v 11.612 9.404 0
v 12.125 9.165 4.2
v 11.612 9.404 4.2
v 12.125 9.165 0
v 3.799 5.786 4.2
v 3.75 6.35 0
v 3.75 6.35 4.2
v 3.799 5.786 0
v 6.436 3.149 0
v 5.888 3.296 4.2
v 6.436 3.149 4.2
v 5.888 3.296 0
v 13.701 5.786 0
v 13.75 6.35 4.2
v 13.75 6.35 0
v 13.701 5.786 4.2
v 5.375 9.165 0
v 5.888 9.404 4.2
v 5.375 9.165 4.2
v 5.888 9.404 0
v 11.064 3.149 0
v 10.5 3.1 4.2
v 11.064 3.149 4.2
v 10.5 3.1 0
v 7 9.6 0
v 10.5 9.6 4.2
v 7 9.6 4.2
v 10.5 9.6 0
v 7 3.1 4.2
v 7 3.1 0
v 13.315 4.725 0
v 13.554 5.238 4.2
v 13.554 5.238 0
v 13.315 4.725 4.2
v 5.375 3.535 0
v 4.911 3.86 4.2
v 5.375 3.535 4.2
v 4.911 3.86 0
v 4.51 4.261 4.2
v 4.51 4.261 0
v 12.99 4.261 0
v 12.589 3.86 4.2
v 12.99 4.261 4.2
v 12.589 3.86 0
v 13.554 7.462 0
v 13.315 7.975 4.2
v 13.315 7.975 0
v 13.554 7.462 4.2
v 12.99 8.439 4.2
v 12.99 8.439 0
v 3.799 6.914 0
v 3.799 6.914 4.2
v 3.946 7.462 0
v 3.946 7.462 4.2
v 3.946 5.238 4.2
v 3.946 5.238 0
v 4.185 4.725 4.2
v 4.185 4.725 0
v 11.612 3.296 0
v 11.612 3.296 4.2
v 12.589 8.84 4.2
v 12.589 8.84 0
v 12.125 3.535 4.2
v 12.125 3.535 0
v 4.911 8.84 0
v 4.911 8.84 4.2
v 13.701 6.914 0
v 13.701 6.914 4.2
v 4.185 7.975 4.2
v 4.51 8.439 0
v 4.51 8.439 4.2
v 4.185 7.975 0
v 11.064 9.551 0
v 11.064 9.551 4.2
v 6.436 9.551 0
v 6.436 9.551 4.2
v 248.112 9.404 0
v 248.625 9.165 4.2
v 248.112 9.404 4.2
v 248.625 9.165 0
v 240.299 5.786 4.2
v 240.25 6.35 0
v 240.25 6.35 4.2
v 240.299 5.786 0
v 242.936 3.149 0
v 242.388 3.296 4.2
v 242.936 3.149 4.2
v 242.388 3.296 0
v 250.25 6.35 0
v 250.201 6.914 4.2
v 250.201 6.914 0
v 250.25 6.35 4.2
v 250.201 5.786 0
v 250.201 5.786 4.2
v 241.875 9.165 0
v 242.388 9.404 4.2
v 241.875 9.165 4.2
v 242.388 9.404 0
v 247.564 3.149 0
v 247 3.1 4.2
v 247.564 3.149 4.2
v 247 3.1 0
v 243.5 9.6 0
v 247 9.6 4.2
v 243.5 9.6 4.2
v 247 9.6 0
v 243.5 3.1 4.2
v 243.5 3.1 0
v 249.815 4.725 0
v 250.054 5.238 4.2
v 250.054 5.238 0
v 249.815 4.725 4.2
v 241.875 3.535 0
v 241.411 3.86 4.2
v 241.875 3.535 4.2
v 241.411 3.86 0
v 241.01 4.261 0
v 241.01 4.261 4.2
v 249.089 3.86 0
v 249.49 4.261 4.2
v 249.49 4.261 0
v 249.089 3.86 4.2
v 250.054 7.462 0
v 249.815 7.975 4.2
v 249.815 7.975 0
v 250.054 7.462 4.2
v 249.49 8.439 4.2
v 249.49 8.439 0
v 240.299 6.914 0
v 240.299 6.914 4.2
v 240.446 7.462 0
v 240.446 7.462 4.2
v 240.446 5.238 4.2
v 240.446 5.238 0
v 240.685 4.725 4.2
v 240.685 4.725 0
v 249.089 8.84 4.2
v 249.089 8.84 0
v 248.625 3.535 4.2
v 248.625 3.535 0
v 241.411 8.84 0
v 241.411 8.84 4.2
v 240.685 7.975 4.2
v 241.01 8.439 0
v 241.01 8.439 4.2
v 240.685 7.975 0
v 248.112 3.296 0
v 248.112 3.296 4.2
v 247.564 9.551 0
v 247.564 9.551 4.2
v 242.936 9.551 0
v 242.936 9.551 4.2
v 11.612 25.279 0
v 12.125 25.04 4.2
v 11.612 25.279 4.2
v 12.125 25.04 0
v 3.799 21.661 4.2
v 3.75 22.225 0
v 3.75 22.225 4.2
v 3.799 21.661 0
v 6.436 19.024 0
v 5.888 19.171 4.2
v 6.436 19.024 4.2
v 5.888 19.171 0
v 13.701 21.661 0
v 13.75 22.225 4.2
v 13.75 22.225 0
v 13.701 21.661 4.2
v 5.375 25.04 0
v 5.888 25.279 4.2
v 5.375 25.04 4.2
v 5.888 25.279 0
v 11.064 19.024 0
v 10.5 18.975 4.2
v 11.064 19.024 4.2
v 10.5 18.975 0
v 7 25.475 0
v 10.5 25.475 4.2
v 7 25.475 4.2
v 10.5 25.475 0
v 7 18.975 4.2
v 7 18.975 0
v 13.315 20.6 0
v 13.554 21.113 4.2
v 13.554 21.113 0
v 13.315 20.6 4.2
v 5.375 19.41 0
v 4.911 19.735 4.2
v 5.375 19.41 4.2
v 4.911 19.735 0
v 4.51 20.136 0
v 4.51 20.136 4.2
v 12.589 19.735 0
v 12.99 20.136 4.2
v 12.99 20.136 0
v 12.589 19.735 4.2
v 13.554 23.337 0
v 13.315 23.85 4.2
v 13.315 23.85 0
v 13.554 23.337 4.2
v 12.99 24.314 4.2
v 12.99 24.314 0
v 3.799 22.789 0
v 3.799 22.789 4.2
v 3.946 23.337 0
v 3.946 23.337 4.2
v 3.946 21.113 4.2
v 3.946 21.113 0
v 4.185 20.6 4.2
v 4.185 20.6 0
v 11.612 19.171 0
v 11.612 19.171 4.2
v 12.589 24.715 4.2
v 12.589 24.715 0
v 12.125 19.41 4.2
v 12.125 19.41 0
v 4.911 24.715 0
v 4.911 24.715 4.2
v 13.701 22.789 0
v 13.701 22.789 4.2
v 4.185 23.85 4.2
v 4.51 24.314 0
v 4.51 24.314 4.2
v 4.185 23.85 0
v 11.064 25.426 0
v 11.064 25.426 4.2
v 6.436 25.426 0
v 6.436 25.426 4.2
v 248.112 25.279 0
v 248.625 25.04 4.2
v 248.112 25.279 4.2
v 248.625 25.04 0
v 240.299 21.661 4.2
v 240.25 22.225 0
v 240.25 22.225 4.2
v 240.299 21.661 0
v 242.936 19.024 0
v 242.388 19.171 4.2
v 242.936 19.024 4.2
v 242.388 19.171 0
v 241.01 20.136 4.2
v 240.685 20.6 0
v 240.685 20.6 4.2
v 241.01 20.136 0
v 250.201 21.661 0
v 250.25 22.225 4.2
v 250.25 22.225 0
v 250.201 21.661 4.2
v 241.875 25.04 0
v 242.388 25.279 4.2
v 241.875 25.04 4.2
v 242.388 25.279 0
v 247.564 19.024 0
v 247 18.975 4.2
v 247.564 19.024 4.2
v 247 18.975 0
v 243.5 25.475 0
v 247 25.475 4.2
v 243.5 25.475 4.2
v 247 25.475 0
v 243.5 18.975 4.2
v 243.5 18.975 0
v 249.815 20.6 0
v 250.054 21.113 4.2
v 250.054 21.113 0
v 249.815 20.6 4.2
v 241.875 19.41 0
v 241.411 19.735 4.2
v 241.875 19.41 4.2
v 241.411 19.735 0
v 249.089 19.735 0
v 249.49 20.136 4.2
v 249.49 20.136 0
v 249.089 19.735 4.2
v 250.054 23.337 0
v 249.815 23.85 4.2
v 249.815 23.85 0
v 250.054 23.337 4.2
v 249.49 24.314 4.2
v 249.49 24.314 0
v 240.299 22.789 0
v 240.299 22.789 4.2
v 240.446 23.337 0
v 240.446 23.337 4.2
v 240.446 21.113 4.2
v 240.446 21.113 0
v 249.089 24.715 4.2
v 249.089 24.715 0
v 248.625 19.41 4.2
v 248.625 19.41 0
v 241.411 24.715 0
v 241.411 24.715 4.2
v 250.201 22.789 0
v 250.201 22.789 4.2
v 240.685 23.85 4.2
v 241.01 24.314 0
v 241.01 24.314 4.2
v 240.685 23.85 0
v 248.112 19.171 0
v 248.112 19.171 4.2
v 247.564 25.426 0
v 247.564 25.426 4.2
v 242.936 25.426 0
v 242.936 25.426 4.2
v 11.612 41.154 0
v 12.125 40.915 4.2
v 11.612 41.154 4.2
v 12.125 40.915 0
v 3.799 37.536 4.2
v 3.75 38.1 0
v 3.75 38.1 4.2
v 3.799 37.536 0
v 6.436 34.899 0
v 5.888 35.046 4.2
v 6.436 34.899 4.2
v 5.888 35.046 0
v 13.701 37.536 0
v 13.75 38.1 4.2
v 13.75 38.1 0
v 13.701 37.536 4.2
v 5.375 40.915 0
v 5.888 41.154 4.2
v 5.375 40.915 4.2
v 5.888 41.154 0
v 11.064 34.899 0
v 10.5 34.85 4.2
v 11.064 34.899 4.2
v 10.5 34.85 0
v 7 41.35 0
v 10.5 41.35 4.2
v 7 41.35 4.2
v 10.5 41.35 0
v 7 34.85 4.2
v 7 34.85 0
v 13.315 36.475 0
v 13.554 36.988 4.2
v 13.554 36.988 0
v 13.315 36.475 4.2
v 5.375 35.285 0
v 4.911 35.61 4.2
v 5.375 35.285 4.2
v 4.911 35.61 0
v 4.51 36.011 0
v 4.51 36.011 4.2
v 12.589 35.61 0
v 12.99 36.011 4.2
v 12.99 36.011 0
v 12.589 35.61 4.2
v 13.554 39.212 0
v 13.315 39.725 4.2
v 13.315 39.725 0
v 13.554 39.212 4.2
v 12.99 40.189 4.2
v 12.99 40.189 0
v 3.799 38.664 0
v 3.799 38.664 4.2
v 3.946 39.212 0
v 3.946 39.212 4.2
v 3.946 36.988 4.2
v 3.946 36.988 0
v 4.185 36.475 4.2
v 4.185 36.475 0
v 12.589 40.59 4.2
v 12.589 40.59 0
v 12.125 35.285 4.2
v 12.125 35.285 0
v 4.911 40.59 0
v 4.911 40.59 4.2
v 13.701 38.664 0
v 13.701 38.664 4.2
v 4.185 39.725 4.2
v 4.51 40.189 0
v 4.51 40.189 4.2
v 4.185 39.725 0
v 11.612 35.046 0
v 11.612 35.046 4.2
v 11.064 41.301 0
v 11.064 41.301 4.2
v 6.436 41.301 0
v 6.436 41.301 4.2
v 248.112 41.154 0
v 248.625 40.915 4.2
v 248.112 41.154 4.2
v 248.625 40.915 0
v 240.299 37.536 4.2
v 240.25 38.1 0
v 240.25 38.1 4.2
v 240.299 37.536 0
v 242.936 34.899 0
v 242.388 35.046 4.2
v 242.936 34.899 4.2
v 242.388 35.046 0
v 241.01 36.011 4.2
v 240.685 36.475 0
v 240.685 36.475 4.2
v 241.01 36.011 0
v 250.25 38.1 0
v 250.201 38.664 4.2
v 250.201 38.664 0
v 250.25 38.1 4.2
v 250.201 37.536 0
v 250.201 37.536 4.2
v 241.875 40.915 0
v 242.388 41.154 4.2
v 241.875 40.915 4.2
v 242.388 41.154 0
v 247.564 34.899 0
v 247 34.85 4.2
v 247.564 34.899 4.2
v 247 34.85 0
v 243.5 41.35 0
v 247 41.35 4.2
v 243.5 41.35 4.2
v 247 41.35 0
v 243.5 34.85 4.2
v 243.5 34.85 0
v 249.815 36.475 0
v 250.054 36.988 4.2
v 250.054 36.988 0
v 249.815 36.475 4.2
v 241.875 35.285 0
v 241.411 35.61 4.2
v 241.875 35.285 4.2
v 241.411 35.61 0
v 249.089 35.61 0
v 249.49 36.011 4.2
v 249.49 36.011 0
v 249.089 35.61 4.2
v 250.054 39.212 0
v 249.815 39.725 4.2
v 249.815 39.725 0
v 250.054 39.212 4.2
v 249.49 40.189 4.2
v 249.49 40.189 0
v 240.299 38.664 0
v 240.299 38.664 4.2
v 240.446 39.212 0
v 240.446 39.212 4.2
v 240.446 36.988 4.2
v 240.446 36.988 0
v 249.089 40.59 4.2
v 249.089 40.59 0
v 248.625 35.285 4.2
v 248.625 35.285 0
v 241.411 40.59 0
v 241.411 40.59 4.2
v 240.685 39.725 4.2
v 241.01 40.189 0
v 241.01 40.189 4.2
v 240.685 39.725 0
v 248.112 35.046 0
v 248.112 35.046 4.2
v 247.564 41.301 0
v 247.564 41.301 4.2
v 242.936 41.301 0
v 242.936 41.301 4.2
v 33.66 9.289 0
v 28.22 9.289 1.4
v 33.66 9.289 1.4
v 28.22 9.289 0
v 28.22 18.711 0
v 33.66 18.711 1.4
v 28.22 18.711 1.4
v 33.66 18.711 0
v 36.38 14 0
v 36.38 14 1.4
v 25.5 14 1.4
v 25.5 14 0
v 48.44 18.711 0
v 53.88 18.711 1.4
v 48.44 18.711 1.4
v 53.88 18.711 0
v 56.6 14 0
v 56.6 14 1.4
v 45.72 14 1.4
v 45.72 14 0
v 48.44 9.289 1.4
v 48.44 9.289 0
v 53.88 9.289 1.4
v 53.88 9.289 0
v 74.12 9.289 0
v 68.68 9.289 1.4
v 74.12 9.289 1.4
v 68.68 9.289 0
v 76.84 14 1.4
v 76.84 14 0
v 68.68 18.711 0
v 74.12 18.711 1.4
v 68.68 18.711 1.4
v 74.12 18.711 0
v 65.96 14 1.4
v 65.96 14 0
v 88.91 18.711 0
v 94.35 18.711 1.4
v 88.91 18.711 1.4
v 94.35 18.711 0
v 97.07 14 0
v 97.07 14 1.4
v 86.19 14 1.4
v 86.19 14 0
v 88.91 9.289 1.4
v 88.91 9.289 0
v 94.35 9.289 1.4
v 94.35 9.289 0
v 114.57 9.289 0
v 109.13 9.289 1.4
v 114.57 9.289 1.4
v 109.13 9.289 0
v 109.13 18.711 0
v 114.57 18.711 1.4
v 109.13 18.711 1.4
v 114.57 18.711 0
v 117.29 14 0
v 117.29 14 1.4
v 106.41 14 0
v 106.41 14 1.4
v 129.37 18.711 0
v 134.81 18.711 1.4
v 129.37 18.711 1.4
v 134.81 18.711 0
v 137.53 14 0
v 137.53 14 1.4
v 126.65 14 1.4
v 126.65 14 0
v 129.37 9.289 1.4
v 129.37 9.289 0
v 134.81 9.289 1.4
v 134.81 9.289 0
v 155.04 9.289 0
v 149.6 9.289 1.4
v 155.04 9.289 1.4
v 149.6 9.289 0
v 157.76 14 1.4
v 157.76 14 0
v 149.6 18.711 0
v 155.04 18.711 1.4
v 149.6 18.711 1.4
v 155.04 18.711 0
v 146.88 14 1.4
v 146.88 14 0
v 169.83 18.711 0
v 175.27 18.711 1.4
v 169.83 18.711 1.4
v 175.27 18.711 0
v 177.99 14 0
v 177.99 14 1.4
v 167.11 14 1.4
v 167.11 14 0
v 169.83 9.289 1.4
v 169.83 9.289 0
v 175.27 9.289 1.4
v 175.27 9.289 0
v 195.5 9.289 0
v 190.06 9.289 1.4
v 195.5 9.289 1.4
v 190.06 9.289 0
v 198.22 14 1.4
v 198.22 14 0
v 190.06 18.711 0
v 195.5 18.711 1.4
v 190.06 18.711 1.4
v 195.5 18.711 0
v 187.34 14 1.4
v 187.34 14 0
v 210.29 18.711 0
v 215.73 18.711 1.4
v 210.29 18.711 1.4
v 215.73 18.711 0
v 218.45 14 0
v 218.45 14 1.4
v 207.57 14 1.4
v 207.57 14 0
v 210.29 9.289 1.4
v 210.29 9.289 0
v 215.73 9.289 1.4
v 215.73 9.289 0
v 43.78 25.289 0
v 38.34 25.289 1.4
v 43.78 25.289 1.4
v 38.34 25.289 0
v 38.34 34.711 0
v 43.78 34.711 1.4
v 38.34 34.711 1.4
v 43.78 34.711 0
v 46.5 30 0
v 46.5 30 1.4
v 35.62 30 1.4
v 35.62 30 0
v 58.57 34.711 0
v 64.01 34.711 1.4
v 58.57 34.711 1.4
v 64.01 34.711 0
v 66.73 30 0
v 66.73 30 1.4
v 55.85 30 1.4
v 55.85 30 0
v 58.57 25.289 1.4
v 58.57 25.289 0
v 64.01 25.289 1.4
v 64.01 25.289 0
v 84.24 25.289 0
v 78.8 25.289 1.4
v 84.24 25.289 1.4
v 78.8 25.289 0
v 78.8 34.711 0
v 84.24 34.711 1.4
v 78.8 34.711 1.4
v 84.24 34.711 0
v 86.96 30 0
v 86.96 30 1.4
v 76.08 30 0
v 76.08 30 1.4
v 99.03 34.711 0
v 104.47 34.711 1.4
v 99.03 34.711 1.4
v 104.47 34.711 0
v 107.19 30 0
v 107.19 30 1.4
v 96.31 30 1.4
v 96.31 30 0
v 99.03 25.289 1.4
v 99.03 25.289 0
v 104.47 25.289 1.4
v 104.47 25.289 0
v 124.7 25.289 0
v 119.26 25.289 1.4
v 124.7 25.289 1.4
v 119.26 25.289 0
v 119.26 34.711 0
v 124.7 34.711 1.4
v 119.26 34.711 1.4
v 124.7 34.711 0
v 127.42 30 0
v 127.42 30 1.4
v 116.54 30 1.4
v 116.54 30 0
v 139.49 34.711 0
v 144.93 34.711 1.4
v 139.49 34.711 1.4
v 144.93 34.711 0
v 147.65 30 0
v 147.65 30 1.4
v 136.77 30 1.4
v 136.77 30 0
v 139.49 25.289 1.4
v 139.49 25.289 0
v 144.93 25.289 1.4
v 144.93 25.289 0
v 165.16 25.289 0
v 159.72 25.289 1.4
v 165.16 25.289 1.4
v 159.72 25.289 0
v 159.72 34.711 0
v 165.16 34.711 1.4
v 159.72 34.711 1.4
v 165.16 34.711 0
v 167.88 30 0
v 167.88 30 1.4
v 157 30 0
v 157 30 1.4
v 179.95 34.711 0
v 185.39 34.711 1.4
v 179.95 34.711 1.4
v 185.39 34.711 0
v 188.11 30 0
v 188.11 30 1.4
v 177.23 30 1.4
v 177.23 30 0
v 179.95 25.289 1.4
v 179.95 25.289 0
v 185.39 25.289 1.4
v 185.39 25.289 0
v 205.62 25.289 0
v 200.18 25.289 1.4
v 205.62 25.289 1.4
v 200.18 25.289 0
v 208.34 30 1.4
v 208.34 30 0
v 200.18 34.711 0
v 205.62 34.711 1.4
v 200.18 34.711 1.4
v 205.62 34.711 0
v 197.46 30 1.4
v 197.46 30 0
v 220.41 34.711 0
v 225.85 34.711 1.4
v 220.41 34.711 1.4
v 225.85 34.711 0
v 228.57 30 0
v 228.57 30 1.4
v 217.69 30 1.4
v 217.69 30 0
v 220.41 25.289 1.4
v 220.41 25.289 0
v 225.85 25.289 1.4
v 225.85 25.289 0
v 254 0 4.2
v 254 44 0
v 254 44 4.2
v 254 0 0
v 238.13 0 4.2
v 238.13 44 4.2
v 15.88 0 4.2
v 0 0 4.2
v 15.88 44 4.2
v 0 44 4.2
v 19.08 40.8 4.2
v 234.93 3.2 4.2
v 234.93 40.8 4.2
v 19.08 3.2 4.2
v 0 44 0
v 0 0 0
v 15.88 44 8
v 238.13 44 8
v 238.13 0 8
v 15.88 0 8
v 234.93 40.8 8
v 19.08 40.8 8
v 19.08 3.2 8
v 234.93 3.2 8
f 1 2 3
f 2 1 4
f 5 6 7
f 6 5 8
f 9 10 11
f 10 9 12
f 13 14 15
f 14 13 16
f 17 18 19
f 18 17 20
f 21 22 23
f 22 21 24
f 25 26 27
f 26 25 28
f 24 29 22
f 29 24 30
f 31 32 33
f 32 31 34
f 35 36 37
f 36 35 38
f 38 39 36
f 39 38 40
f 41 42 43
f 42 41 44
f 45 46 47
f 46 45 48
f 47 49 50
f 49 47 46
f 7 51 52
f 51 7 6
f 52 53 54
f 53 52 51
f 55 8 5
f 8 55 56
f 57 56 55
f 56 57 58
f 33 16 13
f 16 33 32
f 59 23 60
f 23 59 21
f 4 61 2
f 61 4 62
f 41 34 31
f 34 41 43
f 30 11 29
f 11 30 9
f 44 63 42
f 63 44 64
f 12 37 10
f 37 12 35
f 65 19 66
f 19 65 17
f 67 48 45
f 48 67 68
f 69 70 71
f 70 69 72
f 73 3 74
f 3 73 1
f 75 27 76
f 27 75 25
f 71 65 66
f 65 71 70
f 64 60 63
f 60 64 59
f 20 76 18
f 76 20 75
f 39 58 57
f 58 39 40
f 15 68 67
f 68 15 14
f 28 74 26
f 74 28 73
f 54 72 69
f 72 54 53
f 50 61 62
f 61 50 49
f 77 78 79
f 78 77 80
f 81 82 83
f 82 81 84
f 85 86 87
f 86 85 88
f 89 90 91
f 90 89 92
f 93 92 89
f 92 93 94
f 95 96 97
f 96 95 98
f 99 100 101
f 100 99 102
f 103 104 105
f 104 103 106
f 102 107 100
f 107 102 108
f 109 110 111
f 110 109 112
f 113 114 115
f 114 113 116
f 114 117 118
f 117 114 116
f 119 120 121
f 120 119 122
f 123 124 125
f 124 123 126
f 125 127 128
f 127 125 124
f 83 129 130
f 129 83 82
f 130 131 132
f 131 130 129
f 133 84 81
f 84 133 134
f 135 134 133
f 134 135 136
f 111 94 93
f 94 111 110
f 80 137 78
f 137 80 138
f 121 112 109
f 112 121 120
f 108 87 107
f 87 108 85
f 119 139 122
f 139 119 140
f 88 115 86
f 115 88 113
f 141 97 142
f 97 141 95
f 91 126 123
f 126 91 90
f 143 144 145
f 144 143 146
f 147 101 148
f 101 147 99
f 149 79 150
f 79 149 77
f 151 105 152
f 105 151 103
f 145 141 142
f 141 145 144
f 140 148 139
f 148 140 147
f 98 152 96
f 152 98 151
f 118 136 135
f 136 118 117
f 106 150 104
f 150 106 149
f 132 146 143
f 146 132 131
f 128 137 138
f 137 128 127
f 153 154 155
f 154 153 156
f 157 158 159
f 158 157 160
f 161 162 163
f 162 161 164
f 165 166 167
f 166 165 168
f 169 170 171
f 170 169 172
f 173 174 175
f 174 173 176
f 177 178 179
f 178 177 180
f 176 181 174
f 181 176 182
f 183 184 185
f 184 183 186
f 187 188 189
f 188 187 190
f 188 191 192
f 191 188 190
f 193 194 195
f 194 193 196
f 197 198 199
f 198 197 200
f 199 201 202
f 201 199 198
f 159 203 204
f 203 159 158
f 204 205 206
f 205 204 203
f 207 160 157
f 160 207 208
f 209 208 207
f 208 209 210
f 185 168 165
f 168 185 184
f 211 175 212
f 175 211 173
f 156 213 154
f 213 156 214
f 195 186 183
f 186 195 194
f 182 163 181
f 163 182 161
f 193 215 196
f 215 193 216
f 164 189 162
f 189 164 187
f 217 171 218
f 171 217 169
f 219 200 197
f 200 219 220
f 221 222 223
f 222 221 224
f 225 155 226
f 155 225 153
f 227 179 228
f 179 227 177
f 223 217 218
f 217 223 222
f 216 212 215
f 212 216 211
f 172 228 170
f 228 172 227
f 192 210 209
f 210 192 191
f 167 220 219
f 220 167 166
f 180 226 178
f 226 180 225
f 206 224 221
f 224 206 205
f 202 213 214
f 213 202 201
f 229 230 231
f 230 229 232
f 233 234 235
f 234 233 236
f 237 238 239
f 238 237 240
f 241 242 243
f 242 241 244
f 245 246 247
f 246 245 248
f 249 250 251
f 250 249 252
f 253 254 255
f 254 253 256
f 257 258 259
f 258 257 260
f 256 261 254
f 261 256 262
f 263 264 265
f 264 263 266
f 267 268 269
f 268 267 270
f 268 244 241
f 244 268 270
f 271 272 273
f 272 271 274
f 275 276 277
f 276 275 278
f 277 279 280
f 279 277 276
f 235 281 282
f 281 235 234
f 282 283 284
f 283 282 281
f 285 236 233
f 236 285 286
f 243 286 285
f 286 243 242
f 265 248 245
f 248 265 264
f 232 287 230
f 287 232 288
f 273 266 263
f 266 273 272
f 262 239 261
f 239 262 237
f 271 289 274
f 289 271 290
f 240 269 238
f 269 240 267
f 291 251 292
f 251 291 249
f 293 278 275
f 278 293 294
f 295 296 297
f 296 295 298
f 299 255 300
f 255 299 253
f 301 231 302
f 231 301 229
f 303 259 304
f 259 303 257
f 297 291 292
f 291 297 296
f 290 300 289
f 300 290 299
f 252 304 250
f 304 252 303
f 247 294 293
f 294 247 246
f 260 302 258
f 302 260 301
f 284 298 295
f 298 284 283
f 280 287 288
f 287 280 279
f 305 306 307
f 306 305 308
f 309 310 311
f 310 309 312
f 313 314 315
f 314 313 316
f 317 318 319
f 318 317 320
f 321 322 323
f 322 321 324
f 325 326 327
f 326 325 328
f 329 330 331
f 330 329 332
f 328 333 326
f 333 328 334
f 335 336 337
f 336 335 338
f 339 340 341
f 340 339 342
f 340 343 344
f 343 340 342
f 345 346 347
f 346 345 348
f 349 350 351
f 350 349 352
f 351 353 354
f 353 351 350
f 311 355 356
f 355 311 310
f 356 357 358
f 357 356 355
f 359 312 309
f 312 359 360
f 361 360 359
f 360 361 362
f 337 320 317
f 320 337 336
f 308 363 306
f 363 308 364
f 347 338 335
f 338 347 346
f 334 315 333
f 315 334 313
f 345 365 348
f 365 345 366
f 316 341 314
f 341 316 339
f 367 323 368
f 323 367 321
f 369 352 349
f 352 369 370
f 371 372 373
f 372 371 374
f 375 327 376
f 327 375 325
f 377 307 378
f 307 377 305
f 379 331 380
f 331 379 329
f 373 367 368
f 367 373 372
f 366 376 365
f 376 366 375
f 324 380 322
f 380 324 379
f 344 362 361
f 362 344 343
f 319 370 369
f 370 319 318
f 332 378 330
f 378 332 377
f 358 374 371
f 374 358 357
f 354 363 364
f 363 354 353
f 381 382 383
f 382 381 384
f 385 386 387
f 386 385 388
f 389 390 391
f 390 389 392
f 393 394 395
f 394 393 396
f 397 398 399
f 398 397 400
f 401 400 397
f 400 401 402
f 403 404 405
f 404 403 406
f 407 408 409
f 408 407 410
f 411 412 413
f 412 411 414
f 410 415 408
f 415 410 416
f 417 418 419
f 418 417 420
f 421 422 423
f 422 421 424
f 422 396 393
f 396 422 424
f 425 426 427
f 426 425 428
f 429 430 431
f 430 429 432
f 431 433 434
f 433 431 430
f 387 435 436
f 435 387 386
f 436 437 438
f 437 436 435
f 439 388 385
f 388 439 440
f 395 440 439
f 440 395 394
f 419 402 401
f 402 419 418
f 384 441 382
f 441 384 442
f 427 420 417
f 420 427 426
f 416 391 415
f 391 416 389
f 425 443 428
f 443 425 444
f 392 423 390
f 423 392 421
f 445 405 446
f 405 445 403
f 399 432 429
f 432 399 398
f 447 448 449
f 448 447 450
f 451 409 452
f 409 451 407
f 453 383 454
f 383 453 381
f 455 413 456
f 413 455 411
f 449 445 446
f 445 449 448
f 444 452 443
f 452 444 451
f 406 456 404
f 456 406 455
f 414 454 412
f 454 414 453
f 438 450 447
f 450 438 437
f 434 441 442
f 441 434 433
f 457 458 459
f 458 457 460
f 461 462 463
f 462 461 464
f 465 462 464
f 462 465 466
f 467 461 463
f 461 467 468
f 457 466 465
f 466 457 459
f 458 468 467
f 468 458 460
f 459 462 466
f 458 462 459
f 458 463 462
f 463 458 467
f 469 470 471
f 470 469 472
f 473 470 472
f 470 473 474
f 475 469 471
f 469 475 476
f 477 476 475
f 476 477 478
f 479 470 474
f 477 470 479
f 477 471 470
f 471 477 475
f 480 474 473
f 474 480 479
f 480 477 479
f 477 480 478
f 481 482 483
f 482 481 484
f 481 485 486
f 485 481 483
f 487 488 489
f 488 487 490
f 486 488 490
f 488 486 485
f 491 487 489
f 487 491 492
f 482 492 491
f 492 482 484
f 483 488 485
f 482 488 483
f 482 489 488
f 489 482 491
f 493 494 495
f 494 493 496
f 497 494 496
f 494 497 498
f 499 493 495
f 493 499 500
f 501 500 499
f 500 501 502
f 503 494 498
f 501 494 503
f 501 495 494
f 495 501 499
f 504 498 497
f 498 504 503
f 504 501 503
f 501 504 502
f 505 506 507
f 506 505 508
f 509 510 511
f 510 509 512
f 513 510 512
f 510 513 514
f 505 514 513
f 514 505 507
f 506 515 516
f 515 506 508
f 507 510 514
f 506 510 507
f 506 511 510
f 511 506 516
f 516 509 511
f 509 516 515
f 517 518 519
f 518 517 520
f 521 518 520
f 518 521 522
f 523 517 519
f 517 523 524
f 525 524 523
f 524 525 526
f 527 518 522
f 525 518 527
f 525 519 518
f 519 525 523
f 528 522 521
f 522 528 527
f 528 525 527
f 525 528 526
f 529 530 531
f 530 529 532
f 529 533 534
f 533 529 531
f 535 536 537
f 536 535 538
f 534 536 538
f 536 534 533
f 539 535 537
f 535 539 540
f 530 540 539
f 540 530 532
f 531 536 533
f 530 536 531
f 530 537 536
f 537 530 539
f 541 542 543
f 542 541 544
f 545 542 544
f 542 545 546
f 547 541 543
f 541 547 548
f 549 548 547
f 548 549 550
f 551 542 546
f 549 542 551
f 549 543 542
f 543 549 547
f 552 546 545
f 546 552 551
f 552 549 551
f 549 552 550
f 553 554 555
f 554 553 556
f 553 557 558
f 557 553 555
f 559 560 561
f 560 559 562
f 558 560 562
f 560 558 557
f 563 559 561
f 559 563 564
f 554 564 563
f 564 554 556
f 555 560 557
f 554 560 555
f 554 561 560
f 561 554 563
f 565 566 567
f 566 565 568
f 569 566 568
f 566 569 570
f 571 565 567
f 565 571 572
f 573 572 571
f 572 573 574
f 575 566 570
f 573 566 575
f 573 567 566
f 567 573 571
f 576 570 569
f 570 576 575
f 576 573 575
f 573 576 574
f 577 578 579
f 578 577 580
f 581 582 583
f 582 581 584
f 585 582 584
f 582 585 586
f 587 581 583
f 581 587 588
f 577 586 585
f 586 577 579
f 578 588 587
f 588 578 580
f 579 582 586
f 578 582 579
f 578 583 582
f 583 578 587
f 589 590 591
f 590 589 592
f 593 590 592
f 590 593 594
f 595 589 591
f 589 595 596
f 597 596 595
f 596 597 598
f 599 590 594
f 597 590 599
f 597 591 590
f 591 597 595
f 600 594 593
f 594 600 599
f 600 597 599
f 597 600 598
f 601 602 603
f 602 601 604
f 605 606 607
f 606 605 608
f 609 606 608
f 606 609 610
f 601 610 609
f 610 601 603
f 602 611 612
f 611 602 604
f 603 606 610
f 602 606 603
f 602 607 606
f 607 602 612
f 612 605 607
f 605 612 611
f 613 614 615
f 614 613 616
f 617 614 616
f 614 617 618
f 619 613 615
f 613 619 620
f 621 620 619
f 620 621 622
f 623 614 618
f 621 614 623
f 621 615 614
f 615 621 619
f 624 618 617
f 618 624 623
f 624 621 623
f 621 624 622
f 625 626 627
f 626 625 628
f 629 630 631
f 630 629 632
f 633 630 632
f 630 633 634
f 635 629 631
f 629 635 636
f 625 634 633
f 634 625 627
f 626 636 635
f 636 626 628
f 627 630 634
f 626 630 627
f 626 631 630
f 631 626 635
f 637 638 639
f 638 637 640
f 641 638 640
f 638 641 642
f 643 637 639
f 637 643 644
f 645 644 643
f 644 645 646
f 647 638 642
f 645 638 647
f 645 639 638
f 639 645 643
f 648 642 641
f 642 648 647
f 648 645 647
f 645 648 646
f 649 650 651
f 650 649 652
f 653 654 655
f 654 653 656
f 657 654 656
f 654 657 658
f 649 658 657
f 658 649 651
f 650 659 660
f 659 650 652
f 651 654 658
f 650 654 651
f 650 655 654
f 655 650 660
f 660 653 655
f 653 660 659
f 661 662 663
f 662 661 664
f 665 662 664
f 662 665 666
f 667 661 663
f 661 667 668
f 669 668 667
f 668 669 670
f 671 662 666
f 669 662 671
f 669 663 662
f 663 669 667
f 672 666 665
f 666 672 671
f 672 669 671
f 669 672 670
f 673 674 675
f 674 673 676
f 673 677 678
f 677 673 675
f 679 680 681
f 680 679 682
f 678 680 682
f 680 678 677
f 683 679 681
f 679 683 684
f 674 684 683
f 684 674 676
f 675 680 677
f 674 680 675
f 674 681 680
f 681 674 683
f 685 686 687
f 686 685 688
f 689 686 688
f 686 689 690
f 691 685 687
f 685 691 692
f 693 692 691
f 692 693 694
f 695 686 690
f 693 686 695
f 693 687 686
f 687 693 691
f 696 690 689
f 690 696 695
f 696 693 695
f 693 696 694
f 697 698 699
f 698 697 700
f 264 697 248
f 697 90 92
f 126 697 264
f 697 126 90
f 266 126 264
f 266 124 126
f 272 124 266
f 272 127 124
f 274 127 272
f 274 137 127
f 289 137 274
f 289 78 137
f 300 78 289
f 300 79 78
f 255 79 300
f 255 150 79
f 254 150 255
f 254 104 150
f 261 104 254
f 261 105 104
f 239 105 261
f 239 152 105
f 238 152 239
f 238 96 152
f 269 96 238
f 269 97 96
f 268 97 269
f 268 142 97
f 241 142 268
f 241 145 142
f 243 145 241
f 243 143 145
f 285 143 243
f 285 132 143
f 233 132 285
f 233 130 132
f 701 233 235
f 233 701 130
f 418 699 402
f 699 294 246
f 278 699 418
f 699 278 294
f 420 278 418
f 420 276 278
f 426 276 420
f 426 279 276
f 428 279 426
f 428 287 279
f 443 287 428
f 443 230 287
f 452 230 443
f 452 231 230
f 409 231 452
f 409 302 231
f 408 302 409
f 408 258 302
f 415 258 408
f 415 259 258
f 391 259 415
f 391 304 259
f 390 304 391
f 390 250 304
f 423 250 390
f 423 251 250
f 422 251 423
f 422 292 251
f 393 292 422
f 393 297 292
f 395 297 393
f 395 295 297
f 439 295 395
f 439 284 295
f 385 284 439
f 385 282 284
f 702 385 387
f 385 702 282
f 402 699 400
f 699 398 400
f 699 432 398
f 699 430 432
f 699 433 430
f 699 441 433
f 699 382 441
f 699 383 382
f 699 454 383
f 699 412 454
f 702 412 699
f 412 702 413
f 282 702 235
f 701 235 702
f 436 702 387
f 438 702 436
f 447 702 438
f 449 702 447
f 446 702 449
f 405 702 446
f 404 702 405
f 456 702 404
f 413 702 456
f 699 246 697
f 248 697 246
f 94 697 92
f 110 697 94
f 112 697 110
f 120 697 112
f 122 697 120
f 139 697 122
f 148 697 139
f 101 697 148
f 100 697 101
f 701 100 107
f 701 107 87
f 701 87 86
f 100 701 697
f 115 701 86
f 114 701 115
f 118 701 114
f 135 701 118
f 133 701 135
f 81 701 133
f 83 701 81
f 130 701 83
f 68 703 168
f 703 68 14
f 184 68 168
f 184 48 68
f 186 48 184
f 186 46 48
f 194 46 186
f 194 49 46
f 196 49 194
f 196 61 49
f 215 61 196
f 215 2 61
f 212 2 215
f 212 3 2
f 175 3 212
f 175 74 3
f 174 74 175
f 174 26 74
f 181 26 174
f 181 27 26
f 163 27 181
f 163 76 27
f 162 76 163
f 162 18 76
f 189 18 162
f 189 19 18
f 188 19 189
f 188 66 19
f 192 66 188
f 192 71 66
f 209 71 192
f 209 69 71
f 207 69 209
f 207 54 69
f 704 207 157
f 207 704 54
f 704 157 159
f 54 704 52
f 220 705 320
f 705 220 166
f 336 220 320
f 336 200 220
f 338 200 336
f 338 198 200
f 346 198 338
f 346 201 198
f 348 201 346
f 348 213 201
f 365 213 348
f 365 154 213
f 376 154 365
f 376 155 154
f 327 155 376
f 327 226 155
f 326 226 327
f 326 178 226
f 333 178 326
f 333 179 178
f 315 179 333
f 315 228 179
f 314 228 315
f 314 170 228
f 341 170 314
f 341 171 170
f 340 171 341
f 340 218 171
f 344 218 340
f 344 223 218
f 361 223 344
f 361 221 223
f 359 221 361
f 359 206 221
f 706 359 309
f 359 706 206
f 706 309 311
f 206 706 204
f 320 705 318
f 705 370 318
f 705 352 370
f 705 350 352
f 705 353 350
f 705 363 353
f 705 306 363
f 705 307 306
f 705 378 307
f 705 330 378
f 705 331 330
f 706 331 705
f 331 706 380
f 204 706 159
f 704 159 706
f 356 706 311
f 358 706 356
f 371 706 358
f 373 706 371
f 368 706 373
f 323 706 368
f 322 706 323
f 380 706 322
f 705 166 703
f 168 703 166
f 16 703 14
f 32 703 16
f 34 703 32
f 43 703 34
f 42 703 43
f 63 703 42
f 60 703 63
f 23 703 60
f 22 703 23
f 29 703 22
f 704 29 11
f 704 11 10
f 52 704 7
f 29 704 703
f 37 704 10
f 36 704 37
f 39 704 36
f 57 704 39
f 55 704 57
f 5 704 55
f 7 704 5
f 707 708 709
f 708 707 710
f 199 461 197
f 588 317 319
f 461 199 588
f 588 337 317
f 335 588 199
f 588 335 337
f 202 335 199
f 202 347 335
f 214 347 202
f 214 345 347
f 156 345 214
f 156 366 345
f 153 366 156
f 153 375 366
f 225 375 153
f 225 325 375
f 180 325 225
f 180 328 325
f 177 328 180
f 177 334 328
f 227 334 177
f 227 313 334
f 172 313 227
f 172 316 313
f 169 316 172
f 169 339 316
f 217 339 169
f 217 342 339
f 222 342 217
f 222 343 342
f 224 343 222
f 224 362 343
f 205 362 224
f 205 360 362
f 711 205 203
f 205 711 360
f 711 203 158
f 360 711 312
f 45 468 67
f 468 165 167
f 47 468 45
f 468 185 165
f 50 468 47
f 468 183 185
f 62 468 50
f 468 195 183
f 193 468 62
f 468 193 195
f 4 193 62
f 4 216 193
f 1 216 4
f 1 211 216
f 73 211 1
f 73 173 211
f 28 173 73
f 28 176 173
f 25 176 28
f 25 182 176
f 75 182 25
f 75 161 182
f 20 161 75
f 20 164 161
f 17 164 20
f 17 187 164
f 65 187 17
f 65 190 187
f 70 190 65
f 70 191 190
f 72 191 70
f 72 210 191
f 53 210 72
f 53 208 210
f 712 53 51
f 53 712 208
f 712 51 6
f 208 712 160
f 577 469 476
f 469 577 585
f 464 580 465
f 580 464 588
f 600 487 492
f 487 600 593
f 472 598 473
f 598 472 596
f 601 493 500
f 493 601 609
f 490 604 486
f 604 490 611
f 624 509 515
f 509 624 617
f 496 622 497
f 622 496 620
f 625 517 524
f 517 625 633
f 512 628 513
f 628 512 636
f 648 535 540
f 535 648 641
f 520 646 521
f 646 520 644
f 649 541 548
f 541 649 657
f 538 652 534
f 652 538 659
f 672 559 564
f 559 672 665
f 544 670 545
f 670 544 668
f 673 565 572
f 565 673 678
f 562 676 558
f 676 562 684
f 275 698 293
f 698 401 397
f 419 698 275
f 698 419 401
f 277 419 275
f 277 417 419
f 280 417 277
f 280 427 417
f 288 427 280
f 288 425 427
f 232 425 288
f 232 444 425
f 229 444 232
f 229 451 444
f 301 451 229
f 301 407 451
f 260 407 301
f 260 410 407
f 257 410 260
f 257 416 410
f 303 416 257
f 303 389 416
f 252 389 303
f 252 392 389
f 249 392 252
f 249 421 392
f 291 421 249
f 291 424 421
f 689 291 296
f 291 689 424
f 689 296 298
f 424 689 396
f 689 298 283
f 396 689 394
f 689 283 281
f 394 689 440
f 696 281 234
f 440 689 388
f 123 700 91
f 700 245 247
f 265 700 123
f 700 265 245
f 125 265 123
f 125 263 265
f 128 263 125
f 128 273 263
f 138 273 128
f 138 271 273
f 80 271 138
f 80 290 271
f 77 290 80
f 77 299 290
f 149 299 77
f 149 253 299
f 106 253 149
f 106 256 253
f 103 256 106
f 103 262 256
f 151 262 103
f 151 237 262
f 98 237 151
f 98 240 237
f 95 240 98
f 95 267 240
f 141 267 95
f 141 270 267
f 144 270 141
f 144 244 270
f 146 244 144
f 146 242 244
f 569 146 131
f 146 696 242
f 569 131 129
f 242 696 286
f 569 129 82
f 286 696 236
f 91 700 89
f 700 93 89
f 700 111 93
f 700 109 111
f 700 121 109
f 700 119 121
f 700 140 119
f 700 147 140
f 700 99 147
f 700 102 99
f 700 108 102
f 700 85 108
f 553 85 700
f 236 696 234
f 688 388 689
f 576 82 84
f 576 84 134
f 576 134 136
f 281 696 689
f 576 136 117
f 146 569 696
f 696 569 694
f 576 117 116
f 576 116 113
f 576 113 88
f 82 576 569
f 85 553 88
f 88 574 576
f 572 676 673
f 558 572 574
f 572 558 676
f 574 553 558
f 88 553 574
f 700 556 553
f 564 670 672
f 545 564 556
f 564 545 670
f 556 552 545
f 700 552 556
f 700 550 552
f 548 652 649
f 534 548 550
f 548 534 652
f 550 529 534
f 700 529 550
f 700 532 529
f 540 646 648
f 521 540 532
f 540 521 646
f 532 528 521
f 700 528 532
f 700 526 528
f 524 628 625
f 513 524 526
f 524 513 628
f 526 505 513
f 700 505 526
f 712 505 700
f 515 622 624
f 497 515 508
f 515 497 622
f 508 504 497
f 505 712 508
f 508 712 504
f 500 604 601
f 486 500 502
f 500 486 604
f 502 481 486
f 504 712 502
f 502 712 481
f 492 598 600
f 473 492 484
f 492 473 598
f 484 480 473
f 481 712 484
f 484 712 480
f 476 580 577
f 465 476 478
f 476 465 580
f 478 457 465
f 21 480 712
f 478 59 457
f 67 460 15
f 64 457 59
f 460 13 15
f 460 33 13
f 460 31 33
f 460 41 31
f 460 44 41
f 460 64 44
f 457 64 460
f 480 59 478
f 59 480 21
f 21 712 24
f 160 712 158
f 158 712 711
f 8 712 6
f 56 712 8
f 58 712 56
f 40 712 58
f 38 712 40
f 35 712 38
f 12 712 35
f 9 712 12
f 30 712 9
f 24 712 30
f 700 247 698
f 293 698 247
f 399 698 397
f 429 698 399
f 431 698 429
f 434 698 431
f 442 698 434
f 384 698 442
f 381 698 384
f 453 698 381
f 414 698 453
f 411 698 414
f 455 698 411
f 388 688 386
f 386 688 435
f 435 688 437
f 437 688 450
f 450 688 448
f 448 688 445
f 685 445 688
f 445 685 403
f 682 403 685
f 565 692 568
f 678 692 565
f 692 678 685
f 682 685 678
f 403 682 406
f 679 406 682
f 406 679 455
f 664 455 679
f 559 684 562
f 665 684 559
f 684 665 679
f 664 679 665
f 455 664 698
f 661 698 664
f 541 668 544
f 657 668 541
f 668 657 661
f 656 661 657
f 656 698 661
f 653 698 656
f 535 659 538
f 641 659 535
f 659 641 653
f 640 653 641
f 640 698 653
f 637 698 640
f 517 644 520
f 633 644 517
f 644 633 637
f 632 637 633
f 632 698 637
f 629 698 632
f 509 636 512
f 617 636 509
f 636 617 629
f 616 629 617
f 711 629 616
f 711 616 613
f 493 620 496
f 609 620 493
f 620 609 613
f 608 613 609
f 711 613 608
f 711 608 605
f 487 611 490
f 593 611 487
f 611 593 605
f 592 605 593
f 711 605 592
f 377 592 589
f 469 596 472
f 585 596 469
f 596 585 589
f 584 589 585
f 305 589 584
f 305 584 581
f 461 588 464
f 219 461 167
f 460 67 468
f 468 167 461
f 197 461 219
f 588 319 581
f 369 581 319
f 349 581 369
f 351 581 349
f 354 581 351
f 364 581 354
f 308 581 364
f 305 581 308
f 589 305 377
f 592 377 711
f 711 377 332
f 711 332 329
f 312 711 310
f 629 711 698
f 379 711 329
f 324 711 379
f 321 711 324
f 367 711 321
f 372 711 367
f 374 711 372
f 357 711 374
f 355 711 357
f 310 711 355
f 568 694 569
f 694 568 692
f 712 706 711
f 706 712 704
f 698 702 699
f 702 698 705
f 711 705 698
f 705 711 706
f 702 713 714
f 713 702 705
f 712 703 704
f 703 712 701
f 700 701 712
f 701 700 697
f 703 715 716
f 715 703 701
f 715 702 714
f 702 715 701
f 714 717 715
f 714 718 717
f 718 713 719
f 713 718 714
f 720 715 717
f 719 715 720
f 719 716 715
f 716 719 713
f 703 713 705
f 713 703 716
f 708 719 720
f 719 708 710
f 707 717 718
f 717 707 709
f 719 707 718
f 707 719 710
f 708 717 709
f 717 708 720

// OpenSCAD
// ============================================================================
// RackArchitect MCP — Parametric 3D-Printable Slot Cover Panel (.scad)
// Blueprint: Community 3D-Print 10-Inch 1U Designer Cover Panel (Hexagonal Honeycomb Relief) (3dprint-10inch-cover-panel-hex-1u)
// Standard:  10INCH EIA-310 (254mm Total Width, 1U = 44mm)
// Pattern:   HEX (Closed Front Faceplate — Zero Cable Pass-Through)
// Material:  PETG / PLA
// ============================================================================

/* [EIA-310 Cover Panel Parameters (mm)] */
panel_width_mm = 254;
aperture_width_mm = 222.25;
hole_center_pitch_x_mm = 236.5;
panel_height_mm = 44;
u_count = 1;
faceplate_thickness_mm = 4.2;
stiffener_depth_mm = 8;
stiffener_wall_mm = 3.2;
pattern_groove_depth_mm = 1.4;
$fn = 36;

module oval_mounting_slot(slot_w = 10.0, slot_h = 6.5, thickness = 10.0) {
  hull() {
    translate([-(slot_w - slot_h) / 2, 0, -1]) cylinder(d = slot_h, h = thickness);
    translate([ (slot_w - slot_h) / 2, 0, -1]) cylinder(d = slot_h, h = thickness);
  }
}

module eia310_ear_holes() {
  left_hole_x = (panel_width_mm - hole_center_pitch_x_mm) / 2;
  right_hole_x = panel_width_mm - left_hole_x;
  for (u = [0 : u_count - 1]) {
    base_y = u * 44.45;
    for (offset_y = [6.35, 22.225, 38.10]) {
      if (base_y + offset_y < panel_height_mm - 3.0) {
        translate([left_hole_x, base_y + offset_y, 0]) oval_mounting_slot();
        translate([right_hole_x, base_y + offset_y, 0]) oval_mounting_slot();
      }
    }
  }
}

module front_surface_pattern_grooves() {
  // Blind hexagonal honeycomb relief cells (2x10, closed 2.8mm rear baffle wall)
  translate([30.94, 14, -0.5]) cylinder(d = 10.88, h = pattern_groove_depth_mm + 0.5, $fn = 6);
  translate([51.16, 14, -0.5]) cylinder(d = 10.88, h = pattern_groove_depth_mm + 0.5, $fn = 6);
  translate([71.4, 14, -0.5]) cylinder(d = 10.88, h = pattern_groove_depth_mm + 0.5, $fn = 6);
  translate([91.63, 14, -0.5]) cylinder(d = 10.88, h = pattern_groove_depth_mm + 0.5, $fn = 6);
  translate([111.85, 14, -0.5]) cylinder(d = 10.88, h = pattern_groove_depth_mm + 0.5, $fn = 6);
  translate([132.09, 14, -0.5]) cylinder(d = 10.88, h = pattern_groove_depth_mm + 0.5, $fn = 6);
  translate([152.32, 14, -0.5]) cylinder(d = 10.88, h = pattern_groove_depth_mm + 0.5, $fn = 6);
  translate([172.55, 14, -0.5]) cylinder(d = 10.88, h = pattern_groove_depth_mm + 0.5, $fn = 6);
  translate([192.78, 14, -0.5]) cylinder(d = 10.88, h = pattern_groove_depth_mm + 0.5, $fn = 6);
  translate([213.01, 14, -0.5]) cylinder(d = 10.88, h = pattern_groove_depth_mm + 0.5, $fn = 6);
  translate([41.06, 30, -0.5]) cylinder(d = 10.88, h = pattern_groove_depth_mm + 0.5, $fn = 6);
  translate([61.29, 30, -0.5]) cylinder(d = 10.88, h = pattern_groove_depth_mm + 0.5, $fn = 6);
  translate([81.52, 30, -0.5]) cylinder(d = 10.88, h = pattern_groove_depth_mm + 0.5, $fn = 6);
  translate([101.75, 30, -0.5]) cylinder(d = 10.88, h = pattern_groove_depth_mm + 0.5, $fn = 6);
  translate([121.98, 30, -0.5]) cylinder(d = 10.88, h = pattern_groove_depth_mm + 0.5, $fn = 6);
  translate([142.21, 30, -0.5]) cylinder(d = 10.88, h = pattern_groove_depth_mm + 0.5, $fn = 6);
  translate([162.44, 30, -0.5]) cylinder(d = 10.88, h = pattern_groove_depth_mm + 0.5, $fn = 6);
  translate([182.67, 30, -0.5]) cylinder(d = 10.88, h = pattern_groove_depth_mm + 0.5, $fn = 6);
  translate([202.9, 30, -0.5]) cylinder(d = 10.88, h = pattern_groove_depth_mm + 0.5, $fn = 6);
  translate([223.13, 30, -0.5]) cylinder(d = 10.88, h = pattern_groove_depth_mm + 0.5, $fn = 6);
}

module slot_bay_cutouts() {
  // Closed blanking cover panel (zero through-holes; front relief grooves only)
  front_surface_pattern_grooves();
}

module rear_perimeter_stiffener_frame() {
  flange_h = stiffener_depth_mm - faceplate_thickness_mm;
  if (flange_h > 0.5) {
    // Bottom & Top horizontal stiffening ribs
    translate([15.88, 0, faceplate_thickness_mm]) cube([aperture_width_mm, stiffener_wall_mm, flange_h]);
    translate([15.88, panel_height_mm - stiffener_wall_mm, faceplate_thickness_mm]) cube([aperture_width_mm, stiffener_wall_mm, flange_h]);
    // Left & Right vertical stiffening ribs
    translate([15.88, 0, faceplate_thickness_mm]) cube([stiffener_wall_mm, panel_height_mm, flange_h]);
    translate([15.88 + aperture_width_mm - stiffener_wall_mm, 0, faceplate_thickness_mm]) cube([stiffener_wall_mm, panel_height_mm, flange_h]);
  }
}

module rack_carrier_assembly() {
  union() {
    difference() {
      cube([panel_width_mm, panel_height_mm, faceplate_thickness_mm]);
      eia310_ear_holes();
      slot_bay_cutouts();
    }
    rear_perimeter_stiffener_frame();
  }
}

rack_carrier_assembly();
